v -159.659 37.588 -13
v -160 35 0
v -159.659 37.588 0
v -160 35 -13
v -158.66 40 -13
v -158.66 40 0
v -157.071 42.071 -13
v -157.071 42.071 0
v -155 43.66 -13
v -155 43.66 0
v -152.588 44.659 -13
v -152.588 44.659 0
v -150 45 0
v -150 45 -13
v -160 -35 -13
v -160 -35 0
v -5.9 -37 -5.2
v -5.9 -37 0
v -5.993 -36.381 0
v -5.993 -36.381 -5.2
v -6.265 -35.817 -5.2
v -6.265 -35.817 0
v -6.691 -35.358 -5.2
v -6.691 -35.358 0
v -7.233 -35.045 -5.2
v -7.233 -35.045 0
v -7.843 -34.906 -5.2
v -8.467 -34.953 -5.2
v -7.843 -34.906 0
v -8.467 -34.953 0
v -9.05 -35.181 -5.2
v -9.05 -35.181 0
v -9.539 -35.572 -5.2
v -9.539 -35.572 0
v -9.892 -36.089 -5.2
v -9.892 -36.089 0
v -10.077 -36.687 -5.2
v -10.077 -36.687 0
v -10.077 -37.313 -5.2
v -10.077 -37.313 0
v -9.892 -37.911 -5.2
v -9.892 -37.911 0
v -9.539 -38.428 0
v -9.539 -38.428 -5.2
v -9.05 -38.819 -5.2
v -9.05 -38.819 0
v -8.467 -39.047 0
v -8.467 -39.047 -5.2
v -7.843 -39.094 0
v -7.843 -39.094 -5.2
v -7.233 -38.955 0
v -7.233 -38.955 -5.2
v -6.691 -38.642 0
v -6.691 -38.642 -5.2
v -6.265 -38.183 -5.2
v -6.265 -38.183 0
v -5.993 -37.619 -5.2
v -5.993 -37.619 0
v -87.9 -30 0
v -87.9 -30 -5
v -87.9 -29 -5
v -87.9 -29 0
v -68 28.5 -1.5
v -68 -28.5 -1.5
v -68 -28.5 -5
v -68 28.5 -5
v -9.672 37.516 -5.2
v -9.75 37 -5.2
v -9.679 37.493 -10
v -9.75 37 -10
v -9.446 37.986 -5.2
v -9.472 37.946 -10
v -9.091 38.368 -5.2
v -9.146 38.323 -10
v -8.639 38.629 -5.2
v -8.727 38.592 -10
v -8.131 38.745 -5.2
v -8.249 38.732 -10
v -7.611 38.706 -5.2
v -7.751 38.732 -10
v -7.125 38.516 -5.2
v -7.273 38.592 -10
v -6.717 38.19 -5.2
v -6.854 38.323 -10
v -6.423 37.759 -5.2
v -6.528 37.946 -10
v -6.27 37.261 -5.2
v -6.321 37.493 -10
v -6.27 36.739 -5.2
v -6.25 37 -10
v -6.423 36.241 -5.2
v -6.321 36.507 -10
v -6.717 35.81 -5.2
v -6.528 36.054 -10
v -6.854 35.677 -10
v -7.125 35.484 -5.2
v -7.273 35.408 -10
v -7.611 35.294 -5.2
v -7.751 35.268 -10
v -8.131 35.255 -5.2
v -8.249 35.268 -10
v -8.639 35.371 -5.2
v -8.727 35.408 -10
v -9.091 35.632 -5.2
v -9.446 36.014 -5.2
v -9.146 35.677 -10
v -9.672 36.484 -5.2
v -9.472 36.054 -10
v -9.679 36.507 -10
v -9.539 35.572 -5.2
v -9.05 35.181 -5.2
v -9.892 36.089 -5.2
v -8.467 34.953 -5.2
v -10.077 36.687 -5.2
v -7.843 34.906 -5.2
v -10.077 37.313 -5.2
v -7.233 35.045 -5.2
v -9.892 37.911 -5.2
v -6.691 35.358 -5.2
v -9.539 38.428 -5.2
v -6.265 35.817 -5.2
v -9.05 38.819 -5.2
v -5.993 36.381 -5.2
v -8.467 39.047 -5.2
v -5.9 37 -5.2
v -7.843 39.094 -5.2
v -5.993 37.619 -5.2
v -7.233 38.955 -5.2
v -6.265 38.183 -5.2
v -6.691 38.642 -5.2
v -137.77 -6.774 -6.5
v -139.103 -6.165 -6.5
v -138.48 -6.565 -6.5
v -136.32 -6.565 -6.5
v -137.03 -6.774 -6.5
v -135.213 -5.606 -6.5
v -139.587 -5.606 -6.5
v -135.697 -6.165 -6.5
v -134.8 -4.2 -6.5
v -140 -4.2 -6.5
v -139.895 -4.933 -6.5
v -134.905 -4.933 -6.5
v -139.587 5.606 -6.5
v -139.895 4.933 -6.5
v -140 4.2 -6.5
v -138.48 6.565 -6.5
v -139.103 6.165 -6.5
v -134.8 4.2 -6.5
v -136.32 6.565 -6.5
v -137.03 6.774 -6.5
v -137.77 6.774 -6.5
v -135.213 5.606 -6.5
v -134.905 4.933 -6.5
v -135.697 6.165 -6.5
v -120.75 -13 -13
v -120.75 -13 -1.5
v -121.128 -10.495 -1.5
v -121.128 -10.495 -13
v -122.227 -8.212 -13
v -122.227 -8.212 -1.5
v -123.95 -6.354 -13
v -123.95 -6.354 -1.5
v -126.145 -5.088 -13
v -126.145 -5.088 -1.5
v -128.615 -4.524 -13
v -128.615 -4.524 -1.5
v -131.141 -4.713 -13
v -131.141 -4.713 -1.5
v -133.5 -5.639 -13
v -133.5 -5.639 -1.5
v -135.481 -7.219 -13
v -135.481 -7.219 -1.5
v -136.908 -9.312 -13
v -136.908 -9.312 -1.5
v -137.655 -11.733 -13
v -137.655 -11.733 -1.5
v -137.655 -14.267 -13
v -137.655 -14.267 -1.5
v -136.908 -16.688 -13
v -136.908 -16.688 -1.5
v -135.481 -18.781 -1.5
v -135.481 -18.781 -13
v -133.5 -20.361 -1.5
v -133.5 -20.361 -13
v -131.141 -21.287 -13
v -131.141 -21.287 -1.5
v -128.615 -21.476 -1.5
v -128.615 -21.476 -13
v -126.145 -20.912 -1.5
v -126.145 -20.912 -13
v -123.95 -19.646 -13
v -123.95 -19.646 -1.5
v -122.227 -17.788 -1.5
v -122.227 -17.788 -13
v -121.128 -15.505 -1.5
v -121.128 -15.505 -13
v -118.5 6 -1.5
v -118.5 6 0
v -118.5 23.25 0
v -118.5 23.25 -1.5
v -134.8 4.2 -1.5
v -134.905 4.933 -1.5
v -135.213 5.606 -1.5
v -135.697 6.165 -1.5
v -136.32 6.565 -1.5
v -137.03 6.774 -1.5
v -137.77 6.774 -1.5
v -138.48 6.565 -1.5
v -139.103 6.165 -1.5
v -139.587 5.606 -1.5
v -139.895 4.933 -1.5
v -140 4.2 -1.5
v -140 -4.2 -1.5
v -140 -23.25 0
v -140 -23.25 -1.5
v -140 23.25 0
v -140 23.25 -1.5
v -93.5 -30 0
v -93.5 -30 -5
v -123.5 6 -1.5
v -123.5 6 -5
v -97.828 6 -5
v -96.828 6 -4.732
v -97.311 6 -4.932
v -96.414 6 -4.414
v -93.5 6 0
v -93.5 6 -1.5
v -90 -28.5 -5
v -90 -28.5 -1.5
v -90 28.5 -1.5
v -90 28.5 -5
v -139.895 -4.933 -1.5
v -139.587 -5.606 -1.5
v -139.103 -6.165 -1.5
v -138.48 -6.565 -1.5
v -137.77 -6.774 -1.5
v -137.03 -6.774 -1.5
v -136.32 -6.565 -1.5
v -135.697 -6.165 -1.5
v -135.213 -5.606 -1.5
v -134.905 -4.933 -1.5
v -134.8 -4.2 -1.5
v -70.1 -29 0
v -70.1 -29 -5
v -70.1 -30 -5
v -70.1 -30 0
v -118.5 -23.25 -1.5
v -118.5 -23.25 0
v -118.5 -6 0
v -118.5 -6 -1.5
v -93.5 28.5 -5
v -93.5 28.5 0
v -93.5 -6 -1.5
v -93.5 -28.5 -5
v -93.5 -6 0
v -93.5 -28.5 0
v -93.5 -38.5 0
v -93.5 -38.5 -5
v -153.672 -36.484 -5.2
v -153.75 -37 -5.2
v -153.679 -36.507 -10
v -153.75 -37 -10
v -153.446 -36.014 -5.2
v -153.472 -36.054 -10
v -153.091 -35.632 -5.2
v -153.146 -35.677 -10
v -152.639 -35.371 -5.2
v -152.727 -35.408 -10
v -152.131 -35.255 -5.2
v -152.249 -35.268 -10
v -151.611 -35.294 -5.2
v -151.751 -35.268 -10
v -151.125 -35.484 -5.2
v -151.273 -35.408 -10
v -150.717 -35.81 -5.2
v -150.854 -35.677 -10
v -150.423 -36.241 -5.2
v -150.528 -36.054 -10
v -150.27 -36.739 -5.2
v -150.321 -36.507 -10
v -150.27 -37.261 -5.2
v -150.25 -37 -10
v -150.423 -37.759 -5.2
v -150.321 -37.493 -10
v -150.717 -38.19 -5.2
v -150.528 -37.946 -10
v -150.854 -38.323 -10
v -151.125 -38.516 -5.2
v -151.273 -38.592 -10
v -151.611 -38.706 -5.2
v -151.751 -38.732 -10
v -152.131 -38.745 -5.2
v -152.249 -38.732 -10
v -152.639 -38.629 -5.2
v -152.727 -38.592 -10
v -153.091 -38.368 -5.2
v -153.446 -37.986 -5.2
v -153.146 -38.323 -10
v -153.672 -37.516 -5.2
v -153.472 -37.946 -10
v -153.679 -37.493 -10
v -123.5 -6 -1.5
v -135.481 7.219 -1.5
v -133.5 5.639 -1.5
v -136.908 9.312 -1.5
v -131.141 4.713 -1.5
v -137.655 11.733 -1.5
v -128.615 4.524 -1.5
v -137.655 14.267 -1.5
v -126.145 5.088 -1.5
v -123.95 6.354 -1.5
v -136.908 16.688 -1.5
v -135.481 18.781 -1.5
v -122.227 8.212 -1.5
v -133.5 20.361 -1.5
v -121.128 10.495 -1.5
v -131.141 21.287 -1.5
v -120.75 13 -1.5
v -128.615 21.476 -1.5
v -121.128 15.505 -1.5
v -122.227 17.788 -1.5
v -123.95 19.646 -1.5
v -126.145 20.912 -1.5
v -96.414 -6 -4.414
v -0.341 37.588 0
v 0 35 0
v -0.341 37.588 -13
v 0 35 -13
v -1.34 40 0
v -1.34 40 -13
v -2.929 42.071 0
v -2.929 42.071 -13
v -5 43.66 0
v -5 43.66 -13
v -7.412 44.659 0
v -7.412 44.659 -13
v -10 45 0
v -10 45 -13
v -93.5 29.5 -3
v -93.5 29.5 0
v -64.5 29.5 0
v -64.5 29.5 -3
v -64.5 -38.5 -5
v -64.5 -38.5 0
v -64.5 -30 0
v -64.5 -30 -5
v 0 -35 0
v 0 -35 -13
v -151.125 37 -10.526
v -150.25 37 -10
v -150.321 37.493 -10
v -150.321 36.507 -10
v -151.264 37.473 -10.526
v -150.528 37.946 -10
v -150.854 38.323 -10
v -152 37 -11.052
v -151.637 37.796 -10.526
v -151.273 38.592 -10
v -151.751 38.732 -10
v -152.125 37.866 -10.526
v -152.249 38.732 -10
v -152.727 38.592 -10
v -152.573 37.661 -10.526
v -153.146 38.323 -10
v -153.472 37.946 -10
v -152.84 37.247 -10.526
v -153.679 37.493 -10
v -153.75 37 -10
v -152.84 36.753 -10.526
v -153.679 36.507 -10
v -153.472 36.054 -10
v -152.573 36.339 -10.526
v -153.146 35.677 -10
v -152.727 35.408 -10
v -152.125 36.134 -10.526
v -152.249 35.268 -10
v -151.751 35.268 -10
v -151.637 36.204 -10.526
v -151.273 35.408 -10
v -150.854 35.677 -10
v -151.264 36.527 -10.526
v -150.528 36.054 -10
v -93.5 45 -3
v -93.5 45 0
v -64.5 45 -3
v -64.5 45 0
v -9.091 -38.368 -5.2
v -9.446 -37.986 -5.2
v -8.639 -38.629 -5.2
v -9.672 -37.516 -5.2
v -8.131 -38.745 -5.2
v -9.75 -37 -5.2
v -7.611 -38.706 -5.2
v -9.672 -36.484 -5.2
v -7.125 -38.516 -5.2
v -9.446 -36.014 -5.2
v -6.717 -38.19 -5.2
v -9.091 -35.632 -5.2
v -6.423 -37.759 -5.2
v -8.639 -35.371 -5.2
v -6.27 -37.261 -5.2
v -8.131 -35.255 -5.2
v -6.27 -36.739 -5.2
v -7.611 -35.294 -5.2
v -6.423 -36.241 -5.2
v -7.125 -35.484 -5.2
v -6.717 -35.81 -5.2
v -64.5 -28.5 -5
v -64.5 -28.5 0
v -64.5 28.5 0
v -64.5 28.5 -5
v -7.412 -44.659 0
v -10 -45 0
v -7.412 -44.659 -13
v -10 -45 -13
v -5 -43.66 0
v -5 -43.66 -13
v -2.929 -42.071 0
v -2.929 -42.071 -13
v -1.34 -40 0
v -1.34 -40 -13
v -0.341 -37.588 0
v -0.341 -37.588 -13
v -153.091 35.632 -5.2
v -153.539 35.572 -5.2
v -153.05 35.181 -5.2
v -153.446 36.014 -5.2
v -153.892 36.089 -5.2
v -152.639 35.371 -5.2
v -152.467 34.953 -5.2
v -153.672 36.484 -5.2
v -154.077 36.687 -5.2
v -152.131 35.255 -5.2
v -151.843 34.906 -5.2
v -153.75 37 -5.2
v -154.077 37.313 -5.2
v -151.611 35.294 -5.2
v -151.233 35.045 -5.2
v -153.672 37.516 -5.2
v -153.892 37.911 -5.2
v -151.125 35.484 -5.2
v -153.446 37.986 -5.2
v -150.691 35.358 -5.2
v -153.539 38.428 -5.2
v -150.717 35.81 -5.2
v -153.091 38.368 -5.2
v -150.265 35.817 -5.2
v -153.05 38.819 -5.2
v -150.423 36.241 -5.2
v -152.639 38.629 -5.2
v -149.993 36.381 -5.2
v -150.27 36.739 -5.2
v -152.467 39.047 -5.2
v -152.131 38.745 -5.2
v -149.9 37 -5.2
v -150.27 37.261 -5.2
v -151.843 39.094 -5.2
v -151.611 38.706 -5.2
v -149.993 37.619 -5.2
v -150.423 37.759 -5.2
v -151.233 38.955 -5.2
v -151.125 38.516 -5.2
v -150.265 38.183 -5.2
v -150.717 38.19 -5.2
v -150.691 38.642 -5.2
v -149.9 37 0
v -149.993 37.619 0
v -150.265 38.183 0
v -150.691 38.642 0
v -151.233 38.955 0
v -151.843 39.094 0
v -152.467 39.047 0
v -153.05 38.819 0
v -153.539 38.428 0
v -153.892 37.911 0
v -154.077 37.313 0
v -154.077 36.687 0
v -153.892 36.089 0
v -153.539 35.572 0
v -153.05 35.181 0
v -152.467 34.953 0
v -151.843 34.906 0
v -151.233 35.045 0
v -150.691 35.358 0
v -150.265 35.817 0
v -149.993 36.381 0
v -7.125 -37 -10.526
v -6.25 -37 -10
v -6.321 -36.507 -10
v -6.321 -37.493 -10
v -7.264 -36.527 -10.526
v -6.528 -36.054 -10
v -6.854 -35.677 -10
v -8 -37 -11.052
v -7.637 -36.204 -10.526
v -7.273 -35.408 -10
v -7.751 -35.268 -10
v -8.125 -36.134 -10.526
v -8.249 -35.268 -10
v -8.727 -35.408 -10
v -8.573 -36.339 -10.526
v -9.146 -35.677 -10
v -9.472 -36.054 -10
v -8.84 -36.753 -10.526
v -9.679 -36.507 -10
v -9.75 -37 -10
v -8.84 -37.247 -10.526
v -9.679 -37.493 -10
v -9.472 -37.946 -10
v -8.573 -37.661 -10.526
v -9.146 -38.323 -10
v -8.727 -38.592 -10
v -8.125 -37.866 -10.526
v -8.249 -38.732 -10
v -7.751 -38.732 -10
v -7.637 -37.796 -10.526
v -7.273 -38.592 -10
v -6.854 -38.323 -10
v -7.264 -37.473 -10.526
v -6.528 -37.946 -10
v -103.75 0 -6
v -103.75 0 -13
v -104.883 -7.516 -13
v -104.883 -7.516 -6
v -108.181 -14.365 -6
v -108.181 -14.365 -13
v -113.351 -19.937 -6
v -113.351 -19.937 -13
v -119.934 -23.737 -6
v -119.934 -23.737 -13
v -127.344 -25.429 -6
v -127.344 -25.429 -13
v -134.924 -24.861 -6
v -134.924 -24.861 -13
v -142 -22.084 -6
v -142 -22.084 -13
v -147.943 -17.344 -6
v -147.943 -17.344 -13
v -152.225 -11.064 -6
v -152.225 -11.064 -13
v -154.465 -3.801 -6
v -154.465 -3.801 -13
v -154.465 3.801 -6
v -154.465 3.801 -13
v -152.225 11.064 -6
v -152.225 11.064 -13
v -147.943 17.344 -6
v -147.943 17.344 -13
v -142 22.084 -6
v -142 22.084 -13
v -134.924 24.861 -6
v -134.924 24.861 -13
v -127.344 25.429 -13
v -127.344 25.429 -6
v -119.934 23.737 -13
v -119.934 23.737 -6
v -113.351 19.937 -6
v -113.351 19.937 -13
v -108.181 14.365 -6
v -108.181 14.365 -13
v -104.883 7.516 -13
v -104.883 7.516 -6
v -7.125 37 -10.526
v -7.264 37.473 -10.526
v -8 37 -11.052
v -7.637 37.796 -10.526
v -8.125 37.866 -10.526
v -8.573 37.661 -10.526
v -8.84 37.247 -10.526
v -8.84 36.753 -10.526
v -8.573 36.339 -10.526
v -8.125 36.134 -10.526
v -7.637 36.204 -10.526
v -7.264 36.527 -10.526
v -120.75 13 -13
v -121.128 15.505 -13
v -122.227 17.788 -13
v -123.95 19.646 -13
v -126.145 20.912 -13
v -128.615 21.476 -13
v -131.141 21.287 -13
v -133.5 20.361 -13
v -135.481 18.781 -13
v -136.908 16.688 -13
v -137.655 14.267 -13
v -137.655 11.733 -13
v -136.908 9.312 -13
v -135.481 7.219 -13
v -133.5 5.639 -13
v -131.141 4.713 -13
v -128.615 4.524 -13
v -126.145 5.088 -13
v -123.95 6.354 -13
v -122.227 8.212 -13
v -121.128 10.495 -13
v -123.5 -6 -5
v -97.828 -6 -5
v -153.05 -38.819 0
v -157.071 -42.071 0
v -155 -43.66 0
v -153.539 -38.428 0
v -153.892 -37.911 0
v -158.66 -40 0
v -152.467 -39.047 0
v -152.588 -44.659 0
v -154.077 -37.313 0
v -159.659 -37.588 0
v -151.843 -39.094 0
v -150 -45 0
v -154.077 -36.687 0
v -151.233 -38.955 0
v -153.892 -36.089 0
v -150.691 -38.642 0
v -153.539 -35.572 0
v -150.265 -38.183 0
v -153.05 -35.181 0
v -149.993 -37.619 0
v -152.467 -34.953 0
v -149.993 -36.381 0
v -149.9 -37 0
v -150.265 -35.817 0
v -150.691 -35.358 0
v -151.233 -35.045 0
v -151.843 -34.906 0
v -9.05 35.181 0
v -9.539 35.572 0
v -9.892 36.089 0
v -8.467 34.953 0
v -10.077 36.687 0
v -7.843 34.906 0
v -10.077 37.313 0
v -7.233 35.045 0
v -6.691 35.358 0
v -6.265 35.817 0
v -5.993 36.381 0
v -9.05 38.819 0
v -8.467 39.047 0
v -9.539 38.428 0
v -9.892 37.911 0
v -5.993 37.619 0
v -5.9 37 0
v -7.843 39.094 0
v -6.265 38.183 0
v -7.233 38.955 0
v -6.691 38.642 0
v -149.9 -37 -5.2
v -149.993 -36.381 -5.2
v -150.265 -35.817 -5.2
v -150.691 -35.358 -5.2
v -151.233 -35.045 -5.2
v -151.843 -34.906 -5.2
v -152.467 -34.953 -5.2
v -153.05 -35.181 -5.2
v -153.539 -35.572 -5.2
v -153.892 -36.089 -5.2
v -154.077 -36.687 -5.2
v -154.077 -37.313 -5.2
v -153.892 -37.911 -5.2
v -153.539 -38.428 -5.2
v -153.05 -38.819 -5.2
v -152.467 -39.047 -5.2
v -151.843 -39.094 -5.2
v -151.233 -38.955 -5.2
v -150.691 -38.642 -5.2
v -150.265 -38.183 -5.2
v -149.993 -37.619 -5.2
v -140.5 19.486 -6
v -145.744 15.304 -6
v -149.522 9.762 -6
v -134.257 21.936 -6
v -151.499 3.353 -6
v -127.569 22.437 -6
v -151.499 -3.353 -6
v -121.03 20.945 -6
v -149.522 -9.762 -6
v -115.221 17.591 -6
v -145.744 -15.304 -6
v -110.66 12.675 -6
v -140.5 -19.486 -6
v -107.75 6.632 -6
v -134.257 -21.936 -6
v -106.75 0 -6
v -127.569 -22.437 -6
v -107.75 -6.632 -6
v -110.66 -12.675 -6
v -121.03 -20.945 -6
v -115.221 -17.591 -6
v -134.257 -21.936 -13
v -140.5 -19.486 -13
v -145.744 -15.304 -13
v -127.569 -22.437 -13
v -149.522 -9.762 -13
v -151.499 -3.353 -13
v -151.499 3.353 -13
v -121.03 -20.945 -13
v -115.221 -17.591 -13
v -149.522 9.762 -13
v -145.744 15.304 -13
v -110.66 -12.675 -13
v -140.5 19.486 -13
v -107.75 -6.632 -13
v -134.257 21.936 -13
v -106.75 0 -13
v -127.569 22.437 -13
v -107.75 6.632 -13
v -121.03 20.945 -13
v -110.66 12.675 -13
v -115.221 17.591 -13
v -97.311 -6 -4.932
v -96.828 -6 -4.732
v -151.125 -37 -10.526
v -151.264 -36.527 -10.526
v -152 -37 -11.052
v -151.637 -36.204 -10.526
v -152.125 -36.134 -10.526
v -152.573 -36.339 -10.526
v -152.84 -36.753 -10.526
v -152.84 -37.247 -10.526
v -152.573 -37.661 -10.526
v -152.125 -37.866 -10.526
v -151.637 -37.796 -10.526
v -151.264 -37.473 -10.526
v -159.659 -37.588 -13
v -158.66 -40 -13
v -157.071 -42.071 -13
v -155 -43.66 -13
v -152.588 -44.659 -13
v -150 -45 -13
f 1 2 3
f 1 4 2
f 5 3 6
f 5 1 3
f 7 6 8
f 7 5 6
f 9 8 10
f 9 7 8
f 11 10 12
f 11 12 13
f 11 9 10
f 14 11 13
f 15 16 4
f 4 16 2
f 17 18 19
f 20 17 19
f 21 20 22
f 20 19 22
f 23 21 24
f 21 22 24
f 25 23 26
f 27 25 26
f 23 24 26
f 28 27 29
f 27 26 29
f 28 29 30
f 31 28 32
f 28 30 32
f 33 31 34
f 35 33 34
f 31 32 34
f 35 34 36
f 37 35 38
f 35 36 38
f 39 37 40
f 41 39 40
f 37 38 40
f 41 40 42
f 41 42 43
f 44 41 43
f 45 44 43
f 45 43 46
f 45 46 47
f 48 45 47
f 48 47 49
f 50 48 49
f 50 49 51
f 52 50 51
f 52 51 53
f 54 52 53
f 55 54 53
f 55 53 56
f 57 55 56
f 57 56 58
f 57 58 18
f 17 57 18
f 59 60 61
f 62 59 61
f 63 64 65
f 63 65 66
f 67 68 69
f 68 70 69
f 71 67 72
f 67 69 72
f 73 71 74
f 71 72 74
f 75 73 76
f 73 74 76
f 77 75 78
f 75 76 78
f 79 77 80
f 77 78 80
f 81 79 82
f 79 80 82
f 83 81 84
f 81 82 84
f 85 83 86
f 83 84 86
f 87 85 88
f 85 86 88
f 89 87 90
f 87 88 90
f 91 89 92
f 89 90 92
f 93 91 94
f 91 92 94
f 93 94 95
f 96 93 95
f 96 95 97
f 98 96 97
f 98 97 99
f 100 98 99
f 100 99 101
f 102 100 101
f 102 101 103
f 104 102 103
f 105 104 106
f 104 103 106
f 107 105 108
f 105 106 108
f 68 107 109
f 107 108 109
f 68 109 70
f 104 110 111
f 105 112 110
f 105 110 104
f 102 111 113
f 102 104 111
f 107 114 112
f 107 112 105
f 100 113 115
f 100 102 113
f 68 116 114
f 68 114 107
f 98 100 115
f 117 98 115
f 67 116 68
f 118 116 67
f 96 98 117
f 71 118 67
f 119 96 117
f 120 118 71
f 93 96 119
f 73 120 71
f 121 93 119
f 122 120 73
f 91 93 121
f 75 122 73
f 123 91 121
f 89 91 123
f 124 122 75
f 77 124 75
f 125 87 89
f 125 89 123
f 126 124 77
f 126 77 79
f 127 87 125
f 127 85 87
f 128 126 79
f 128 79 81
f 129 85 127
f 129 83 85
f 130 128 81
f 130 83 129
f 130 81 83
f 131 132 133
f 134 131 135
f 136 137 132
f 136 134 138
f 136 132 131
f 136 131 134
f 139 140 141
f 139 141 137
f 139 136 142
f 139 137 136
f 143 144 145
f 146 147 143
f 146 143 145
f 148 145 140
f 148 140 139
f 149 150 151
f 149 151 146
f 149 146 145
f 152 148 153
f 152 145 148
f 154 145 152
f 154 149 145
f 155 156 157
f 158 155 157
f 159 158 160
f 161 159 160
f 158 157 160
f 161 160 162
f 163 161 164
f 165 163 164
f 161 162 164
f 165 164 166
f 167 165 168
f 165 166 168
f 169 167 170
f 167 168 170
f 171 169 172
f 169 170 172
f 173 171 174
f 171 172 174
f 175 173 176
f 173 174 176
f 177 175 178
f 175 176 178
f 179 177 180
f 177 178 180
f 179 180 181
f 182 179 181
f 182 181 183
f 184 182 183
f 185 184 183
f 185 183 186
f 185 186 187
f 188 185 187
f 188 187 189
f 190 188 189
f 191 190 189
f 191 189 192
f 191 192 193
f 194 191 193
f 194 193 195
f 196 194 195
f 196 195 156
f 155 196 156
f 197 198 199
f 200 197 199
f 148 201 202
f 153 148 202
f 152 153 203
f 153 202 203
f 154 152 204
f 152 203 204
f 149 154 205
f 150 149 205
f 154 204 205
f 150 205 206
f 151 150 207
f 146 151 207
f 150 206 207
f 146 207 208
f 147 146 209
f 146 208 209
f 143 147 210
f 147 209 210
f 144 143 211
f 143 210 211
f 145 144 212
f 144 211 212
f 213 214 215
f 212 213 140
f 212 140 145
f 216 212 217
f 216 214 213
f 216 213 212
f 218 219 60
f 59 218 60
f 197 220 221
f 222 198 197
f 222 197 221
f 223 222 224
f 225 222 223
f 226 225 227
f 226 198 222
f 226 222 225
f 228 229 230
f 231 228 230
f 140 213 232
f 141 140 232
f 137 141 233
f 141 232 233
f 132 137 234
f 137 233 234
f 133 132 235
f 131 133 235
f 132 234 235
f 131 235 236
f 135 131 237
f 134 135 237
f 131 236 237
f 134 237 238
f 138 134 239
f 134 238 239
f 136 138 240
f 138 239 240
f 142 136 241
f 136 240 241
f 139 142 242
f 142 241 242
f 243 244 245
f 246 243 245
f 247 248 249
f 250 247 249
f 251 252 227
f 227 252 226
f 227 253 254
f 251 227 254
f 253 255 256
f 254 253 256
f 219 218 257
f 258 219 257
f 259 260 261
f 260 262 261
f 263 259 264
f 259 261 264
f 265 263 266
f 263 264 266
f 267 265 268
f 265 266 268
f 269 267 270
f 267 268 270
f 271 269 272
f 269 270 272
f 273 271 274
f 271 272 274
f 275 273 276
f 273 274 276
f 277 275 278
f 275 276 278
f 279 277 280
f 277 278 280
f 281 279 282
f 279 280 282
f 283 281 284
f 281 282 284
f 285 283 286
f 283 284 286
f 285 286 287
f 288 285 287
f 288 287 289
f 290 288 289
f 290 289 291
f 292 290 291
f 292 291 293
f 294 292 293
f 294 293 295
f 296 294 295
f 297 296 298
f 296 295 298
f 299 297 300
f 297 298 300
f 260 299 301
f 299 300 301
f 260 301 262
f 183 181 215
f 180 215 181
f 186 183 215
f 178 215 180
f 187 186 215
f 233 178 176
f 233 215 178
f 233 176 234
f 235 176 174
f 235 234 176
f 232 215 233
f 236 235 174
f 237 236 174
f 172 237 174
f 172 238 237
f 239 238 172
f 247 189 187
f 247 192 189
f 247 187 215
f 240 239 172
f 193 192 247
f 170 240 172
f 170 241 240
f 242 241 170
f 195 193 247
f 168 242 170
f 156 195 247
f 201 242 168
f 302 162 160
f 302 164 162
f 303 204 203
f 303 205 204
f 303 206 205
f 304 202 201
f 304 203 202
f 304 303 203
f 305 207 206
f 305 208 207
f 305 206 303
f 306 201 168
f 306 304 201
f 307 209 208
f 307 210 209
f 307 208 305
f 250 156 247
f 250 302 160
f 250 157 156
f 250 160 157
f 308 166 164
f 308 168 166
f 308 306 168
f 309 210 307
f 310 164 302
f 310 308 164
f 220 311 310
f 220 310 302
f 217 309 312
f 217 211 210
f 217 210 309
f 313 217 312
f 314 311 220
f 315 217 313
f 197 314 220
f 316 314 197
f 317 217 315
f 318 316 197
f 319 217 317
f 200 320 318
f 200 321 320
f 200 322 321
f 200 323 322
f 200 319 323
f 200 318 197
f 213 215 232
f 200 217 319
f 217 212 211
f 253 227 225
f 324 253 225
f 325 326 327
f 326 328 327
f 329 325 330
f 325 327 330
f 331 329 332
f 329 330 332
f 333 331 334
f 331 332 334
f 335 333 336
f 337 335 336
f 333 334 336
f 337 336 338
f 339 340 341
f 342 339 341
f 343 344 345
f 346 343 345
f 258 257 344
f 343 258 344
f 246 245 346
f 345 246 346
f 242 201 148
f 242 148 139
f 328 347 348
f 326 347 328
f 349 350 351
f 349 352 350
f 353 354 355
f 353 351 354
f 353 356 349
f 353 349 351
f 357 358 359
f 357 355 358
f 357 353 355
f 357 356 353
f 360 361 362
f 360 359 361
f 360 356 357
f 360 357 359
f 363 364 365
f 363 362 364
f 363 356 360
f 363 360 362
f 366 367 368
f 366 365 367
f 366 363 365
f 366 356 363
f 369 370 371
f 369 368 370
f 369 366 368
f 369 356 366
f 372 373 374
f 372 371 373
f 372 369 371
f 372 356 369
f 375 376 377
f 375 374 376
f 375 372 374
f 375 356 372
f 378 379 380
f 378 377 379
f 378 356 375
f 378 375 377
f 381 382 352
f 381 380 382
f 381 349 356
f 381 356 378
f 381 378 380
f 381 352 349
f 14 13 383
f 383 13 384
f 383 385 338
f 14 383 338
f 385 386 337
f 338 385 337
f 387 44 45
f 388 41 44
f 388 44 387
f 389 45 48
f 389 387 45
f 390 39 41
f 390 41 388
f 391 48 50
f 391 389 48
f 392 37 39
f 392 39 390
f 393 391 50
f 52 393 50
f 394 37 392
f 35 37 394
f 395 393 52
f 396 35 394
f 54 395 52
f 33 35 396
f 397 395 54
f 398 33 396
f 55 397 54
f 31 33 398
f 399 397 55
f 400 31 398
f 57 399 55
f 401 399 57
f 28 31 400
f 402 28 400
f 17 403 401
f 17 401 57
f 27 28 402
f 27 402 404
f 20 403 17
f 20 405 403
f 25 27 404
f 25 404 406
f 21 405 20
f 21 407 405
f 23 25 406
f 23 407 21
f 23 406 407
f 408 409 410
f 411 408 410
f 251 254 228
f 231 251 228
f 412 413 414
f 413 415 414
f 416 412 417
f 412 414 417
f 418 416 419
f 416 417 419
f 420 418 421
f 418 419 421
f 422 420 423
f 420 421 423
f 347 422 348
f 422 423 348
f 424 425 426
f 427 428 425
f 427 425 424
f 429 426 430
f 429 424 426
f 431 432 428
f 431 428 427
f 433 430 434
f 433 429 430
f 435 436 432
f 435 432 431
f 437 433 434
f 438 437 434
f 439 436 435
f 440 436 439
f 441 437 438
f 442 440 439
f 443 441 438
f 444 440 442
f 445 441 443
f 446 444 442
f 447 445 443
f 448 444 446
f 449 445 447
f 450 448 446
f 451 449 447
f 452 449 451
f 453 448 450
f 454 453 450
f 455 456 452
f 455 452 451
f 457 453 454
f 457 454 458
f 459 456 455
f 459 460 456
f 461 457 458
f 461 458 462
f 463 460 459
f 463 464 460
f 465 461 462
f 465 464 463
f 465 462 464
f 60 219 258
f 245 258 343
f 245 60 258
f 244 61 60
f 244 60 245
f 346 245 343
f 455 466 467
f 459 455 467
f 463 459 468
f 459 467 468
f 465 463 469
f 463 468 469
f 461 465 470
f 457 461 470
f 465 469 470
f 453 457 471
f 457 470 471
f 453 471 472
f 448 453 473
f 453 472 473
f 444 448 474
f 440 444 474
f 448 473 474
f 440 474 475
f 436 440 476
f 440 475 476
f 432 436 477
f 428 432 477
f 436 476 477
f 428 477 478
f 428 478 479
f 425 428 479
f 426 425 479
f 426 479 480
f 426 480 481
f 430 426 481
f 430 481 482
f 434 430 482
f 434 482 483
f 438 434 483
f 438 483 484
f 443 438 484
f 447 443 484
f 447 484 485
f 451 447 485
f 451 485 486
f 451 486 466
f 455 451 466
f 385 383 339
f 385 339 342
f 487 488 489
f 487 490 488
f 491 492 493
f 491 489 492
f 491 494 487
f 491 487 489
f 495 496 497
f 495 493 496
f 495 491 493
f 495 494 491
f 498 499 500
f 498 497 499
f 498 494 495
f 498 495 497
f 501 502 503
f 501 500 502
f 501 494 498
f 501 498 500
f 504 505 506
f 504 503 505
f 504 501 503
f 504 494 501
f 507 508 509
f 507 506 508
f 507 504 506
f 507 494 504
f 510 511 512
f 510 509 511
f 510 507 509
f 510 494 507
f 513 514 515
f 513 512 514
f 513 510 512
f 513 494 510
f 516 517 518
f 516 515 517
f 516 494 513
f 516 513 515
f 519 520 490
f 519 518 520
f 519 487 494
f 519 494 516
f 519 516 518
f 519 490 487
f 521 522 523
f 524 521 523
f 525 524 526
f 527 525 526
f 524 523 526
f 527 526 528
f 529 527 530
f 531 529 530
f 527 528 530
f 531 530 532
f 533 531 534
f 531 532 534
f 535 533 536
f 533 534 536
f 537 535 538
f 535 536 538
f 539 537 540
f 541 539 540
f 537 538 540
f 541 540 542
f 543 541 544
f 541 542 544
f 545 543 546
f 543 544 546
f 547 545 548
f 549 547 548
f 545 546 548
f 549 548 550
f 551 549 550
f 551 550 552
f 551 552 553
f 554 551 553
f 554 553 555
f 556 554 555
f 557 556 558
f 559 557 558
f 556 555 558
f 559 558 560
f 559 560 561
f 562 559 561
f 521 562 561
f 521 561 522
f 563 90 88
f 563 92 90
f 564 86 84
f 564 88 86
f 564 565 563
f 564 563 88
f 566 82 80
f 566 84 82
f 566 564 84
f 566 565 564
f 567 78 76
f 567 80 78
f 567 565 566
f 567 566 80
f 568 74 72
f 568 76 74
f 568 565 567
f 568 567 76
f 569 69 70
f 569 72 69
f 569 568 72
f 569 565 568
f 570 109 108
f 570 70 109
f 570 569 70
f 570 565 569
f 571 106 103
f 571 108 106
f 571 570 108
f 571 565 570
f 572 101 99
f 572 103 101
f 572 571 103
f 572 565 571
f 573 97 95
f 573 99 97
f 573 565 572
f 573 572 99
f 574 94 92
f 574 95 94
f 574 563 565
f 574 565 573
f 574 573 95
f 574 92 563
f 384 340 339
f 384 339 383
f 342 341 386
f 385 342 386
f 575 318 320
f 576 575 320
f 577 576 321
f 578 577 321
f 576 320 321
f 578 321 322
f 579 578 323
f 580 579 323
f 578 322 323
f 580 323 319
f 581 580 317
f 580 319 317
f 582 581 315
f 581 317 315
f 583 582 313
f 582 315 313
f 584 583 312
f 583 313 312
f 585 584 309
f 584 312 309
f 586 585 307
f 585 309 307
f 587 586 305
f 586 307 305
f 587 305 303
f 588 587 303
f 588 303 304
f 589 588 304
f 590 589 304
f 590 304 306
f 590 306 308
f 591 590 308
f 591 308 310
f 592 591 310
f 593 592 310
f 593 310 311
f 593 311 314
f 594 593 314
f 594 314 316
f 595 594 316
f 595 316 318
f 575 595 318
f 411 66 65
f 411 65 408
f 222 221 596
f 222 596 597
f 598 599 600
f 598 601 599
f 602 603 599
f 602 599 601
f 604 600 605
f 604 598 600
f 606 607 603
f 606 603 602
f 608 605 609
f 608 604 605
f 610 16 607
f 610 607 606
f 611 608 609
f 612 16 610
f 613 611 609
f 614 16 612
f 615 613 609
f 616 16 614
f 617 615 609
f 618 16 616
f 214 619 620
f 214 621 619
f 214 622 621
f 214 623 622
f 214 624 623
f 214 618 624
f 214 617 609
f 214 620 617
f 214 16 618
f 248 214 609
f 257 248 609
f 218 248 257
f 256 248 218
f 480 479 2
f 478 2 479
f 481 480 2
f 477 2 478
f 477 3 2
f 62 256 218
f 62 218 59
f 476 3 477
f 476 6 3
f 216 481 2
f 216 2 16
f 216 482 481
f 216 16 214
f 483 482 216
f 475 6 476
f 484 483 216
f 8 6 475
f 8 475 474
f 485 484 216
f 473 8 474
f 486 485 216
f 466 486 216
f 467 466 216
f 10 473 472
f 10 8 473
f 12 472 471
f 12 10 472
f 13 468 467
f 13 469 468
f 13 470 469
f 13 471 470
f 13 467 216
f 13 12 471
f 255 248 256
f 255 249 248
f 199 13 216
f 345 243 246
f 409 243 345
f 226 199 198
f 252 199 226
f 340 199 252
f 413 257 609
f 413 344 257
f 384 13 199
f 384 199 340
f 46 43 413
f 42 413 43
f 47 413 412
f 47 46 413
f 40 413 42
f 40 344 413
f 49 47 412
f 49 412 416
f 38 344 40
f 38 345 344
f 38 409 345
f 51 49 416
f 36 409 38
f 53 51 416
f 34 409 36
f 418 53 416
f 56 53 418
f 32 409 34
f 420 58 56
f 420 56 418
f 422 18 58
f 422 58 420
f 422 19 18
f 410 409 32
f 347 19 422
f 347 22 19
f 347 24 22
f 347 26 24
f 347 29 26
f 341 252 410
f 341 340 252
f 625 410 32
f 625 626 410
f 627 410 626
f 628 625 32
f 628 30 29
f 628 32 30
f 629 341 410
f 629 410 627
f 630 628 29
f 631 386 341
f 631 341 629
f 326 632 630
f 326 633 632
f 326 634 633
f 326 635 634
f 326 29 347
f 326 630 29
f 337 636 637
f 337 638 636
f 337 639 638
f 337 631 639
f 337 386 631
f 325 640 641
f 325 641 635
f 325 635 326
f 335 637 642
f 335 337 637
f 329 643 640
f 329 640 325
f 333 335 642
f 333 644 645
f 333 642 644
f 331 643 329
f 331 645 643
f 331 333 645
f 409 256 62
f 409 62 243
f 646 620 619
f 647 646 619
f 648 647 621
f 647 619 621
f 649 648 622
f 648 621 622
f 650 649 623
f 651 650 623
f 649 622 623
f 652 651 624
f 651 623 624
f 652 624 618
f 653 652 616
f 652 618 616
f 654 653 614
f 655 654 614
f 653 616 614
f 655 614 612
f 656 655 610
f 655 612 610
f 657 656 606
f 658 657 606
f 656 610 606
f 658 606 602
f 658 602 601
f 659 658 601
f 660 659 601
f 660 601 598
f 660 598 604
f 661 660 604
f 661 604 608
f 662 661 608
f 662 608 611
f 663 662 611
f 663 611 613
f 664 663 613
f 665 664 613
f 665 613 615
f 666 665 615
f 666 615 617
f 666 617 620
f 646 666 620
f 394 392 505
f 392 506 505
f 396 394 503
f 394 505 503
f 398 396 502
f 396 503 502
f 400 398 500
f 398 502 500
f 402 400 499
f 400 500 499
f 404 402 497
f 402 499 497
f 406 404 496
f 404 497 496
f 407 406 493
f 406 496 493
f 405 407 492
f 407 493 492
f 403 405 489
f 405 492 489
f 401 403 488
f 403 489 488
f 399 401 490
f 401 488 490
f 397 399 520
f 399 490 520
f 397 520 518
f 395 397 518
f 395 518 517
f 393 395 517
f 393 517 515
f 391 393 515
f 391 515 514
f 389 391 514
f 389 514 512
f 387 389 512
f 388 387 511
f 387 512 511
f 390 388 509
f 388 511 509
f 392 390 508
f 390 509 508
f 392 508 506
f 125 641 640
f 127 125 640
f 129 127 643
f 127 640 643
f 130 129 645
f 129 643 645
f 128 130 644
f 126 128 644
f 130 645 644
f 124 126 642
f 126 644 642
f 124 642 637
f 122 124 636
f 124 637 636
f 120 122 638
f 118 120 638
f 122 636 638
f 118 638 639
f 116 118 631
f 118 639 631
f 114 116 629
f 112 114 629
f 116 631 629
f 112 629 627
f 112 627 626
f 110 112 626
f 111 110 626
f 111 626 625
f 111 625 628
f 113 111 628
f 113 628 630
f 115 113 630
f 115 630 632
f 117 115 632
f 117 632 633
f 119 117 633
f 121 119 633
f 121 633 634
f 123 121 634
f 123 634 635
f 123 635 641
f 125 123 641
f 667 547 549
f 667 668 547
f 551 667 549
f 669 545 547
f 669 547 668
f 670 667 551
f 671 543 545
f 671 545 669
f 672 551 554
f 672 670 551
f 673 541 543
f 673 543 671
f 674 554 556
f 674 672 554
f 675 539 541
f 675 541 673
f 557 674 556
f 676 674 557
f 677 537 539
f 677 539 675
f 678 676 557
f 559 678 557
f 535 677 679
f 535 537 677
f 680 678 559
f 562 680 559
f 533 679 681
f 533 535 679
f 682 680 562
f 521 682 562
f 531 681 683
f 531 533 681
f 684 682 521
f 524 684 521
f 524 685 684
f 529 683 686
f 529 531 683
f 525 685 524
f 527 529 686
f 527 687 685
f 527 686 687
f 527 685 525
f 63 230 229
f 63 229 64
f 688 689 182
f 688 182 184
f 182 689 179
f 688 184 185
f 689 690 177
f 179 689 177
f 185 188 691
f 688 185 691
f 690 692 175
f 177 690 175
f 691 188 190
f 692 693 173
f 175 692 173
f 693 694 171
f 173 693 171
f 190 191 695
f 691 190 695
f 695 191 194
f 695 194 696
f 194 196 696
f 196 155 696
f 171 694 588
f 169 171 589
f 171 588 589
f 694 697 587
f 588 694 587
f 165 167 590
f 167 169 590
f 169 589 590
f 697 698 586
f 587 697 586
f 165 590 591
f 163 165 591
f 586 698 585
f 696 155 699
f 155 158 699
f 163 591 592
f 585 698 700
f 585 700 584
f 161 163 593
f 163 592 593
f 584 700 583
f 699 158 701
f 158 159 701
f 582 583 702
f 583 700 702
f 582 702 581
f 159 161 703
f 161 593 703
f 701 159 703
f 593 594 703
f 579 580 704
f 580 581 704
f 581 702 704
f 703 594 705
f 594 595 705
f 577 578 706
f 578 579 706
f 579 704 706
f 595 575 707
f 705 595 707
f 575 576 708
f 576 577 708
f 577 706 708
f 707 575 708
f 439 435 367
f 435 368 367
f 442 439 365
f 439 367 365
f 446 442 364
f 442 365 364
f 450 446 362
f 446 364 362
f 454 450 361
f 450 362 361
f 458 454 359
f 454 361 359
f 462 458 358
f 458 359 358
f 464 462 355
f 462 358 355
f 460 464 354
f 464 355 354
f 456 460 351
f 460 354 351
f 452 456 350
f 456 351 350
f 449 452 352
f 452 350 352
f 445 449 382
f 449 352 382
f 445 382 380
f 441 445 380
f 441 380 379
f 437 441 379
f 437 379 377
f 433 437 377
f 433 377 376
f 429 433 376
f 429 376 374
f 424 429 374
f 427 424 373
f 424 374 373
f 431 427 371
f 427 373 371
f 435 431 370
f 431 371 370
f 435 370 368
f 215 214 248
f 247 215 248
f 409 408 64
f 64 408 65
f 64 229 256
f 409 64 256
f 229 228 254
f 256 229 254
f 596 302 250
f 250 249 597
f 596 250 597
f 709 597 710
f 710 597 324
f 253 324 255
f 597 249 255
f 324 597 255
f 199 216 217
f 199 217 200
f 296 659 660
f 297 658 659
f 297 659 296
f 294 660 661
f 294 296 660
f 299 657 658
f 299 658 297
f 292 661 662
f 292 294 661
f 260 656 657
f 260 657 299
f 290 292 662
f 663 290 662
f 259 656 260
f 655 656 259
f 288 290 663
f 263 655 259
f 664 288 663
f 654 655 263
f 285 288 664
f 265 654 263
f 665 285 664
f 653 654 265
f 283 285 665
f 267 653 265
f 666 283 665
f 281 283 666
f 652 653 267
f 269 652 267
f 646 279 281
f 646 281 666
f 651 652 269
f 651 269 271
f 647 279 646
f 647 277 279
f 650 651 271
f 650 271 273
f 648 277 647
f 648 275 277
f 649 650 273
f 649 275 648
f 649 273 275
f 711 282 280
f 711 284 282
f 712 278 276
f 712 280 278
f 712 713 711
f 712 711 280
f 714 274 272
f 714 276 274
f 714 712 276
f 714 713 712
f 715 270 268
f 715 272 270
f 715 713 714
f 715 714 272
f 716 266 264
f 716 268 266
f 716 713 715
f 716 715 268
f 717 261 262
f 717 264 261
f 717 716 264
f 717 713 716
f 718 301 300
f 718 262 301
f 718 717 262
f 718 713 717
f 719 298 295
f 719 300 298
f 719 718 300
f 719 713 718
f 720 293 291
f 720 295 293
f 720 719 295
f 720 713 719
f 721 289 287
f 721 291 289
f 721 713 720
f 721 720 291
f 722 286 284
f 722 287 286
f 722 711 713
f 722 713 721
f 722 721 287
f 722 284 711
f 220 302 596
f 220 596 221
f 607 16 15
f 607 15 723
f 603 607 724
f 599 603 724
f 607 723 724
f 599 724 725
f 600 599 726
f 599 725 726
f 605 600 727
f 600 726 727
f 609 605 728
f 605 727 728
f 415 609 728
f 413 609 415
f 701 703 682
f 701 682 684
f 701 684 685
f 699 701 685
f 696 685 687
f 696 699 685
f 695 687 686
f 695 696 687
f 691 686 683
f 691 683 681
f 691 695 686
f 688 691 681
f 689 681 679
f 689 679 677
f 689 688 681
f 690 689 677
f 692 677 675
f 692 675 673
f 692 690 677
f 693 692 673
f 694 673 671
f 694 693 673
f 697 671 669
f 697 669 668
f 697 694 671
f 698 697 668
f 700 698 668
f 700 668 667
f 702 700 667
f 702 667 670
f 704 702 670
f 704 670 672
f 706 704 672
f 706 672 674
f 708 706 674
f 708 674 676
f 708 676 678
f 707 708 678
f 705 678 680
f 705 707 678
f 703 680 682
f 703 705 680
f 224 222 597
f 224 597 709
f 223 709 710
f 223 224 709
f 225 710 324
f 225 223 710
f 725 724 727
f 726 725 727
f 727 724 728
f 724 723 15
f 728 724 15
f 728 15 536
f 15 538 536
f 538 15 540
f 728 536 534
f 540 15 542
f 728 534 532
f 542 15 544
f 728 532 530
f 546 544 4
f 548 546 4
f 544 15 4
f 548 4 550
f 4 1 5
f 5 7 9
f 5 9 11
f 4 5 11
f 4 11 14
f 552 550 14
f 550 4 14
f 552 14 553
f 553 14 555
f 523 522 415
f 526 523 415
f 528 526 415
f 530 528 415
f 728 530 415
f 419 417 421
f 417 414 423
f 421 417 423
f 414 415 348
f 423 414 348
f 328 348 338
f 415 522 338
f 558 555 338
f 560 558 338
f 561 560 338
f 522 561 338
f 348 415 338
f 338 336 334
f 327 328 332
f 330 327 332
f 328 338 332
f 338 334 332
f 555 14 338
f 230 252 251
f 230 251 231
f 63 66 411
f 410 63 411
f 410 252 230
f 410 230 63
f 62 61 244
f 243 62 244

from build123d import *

# Parameters (mm, degrees)
SKETCH018_W         = 160
SKETCH018_H         = 90
PAD004_DEPTH        = 13
HOLE005_D           = 3.5
HOLE005_DEPTH       = 10
HOLE005_CBORE_D     = 4.2
HOLE005_CBORE_DEPTH = 5.2
HOLE005_TIPS_R      = 1.75
SKETCH020_R         = 8.5
POCKET008_DEPTH     = 13.001
SKETCH021_W         = 5
SKETCH021_H         = 12
SKETCH021_W_2       = 3.5
SKETCH021_H_2       = 57
SKETCH021_W_3       = 29
SKETCH021_H_3       = 10
POCKET009_DEPTH     = 5
SKETCH022_W         = 21.5
SKETCH022_H         = 46.5
SKETCH022_W_2       = 29
SKETCH022_H_2       = 57
SKETCH022_W_3       = 30
SKETCH022_H_3       = 12
POCKET010_DEPTH     = 1.5
SKETCH031_R         = 25.5
SKETCH031_R_2       = 22.5
POCKET016_DEPTH     = 7
PAD_DEPTH           = 5
FILLET_R            = 10
SKETCH034_W         = 29
SKETCH034_H         = 15.5
POCKET018_DEPTH     = 3
POCKET019_DEPTH     = 5
POCKET021_DEPTH     = 12


with BuildPart() as part:
    # Sketch018 → Pad004 (new body)
    with BuildSketch(Plane.XY):
        with Locations((-80, 0)):
            Rectangle(SKETCH018_W, SKETCH018_H)
    extrude(amount=-PAD004_DEPTH)

    # Hole005
    with Locations(Plane.XY):
        with Locations((-152, 37), (-8, 37), (-152, -37), (-8, -37)):
            CounterBoreHole(HOLE005_D / 2, HOLE005_CBORE_D / 2, HOLE005_CBORE_DEPTH, depth=HOLE005_DEPTH)

    # Hole005 tips → Hole005 tip 1 section 0
    with BuildSketch(Plane.XY.offset(-10), mode=Mode.PRIVATE) as hole005_tip_1_s0:
        with Locations((-152, 37)):
            Circle(HOLE005_TIPS_R)
    loft([hole005_tip_1_s0.sketch, Vertex(-152, 37, -11.051506)], mode=Mode.SUBTRACT)

    # Hole005 tips → Hole005 tip 2 section 0
    with BuildSketch(Plane.XY.offset(-10), mode=Mode.PRIVATE) as hole005_tip_2_s0:
        with Locations((-8, 37)):
            Circle(HOLE005_TIPS_R)
    loft([hole005_tip_2_s0.sketch, Vertex(-8, 37, -11.051506)], mode=Mode.SUBTRACT)

    # Hole005 tips → Hole005 tip 3 section 0
    with BuildSketch(Plane.XY.offset(-10), mode=Mode.PRIVATE) as hole005_tip_3_s0:
        with Locations((-152, -37)):
            Circle(HOLE005_TIPS_R)
    loft([hole005_tip_3_s0.sketch, Vertex(-152, -37, -11.051506)], mode=Mode.SUBTRACT)

    # Hole005 tips → Hole005 tip 4 section 0
    with BuildSketch(Plane.XY.offset(-10), mode=Mode.PRIVATE) as hole005_tip_4_s0:
        with Locations((-8, -37)):
            Circle(HOLE005_TIPS_R)
    loft([hole005_tip_4_s0.sketch, Vertex(-8, -37, -11.051506)], mode=Mode.SUBTRACT)

    # Sketch020 (on Face4 of Hole005) → Pocket008 (cut, through all)
    with BuildSketch(Plane.XY):
        with Locations((-129.25, 13)):
            Circle(SKETCH020_R)
        with Locations((-129.25, -13)):
            Circle(SKETCH020_R)
    extrude(amount=-POCKET008_DEPTH, mode=Mode.SUBTRACT)

    # Sketch021 (on Face4 of Pocket008) → Pocket009 (cut)
    with BuildSketch(Plane.XY):
        with Locations((-121, 0)):
            Rectangle(SKETCH021_W, SKETCH021_H)
        with Locations((-91.75, 0)):
            Rectangle(SKETCH021_W_2, SKETCH021_H_2)
        with Locations((-66.25, 0)):
            Rectangle(SKETCH021_W_2, SKETCH021_H_2)
        with Locations((-79, -33.5)):
            Rectangle(SKETCH021_W_3, SKETCH021_H_3)
    extrude(amount=-POCKET009_DEPTH, mode=Mode.SUBTRACT)

    # Sketch022 (on Face4 of Pocket009) → Pocket010 (cut)
    with BuildSketch(Plane.XY):
        with Locations((-129.25, 0)):
            Rectangle(SKETCH022_W, SKETCH022_H)
        with Locations((-79, 0)):
            Rectangle(SKETCH022_W_2, SKETCH022_H_2)
        with Locations((-108.5, 0)):
            Rectangle(SKETCH022_W_3, SKETCH022_H_3)
    extrude(amount=-POCKET010_DEPTH, mode=Mode.SUBTRACT)

    # Sketch031 (on Face7 of Pocket010) → Pocket016 (cut)
    with BuildSketch(Plane(origin=(0, 0, -13), x_dir=(1, 0, 0), z_dir=(0, 0, -1))):
        with Locations((-129.25, 0)):
            Circle(SKETCH031_R)
        with Locations((-129.25, 0)):
            Circle(SKETCH031_R_2, mode=Mode.SUBTRACT)
    extrude(amount=-POCKET016_DEPTH, mode=Mode.SUBTRACT)

    # Sketch033 (on Face8 of Pocket016) → Pad (join)
    with BuildSketch(Plane.XY.offset(-5)):
        Polygon((-87.9, -29), (-70.1, -29), (-70.1, -30), (-64.5, -30), (-64.5, -28.5), (-93.5, -28.5), (-93.5, -30), (-87.9, -30), align=None)
    extrude(amount=PAD_DEPTH)

    # Fillet
    fillet_edges = [part.edges().sort_by_distance(p)[0] for p in [
        (0, 45, -6.5),
        (0, -45, -6.5),
        (-160, -45, -6.5),
        (-160, 45, -6.5),
    ]]
    fillet(fillet_edges, radius=FILLET_R)

    # Sketch034 (on Face35 of Pad) → Pocket018 (cut)
    with BuildSketch(Plane.XY):
        with Locations((-79, 37.25)):
            Rectangle(SKETCH034_W, SKETCH034_H)
    extrude(amount=-POCKET018_DEPTH, mode=Mode.SUBTRACT)

    # Sketch035 (on Face48 of Pocket018) → Pocket019 (cut)
    with BuildSketch(Plane.XY.offset(-1.5)):
        with BuildLine():
            ThreePointArc((-134.8, 4.2), (-137.4, 6.8), (-140, 4.2))
            Line((-140, 4.2), (-140, -4.2))
            ThreePointArc((-140, -4.2), (-137.4, -6.8), (-134.8, -4.2))
            Line((-134.8, 4.2), (-134.8, -4.2))
        make_face()
    extrude(amount=-POCKET019_DEPTH, mode=Mode.SUBTRACT)

    # Sketch038 (on Face29 of Pocket019) → Pocket021 (cut)
    with BuildSketch(Plane.XZ.offset(-6)):
        with BuildLine():
            Line((-118.5, -5), (-118.5, -1.5))
            Line((-118.5, -1.5), (-93.5, -1.5))
            Line((-93.5, -1.5), (-96.414214, -4.414214))
            ThreePointArc((-97.828427, -5), (-97.06306, -4.847759), (-96.414214, -4.414214))
            Line((-118.5, -5), (-97.828427, -5))
        make_face()
    extrude(amount=POCKET021_DEPTH, mode=Mode.SUBTRACT)


solid = part.part
